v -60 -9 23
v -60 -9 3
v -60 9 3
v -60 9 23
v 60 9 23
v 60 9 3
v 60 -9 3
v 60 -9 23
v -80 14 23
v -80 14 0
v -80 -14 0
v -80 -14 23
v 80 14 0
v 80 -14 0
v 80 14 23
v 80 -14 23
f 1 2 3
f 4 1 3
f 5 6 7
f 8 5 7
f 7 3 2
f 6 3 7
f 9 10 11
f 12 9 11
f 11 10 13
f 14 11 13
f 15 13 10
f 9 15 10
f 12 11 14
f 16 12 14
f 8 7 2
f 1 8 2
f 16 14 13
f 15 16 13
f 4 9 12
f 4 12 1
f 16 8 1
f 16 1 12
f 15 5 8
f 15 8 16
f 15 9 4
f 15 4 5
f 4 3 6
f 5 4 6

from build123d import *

# Parameters (mm, degrees)
F0_W     = 98
F0_H     = 5
F0_H_2   = 18
F0_W_2   = 11
F1_DEPTH = 3
F2_DEPTH = 23


with BuildPart() as f1:
    # F0 (on Top) → F1 (new body)
    with BuildSketch(Plane.XY):
        Polygon((-80, -14), (-49, -14), (-49, -9), (-60, -9), (-60, 9), (-49, 9), (-49, 14), (-80, 14), align=None)
        with Locations((0, 11.5)):
            Rectangle(F0_W, F0_H)
        Rectangle(F0_W, F0_H_2)
        with Locations((-54.5, 0)):
            Rectangle(F0_W_2, F0_H_2)
        with Locations((0, -11.5)):
            Rectangle(F0_W, F0_H)
        Polygon((49, -14), (80, -14), (80, 14), (49, 14), (49, 9), (60, 9), (60, -9), (49, -9), align=None)
        with Locations((54.5, 0)):
            Rectangle(F0_W_2, F0_H_2)
    extrude(amount=F1_DEPTH)

    # F0 (on Top) → F2 (join)
    with BuildSketch(Plane.XY):
        Polygon((-80, -14), (-49, -14), (-49, -9), (-60, -9), (-60, 9), (-49, 9), (-49, 14), (-80, 14), align=None)
        with Locations((0, 11.5)):
            Rectangle(F0_W, F0_H)
        with Locations((0, -11.5)):
            Rectangle(F0_W, F0_H)
        Polygon((49, -14), (80, -14), (80, 14), (49, 14), (49, 9), (60, 9), (60, -9), (49, -9), align=None)
    extrude(amount=F2_DEPTH)


solid = f1.part
